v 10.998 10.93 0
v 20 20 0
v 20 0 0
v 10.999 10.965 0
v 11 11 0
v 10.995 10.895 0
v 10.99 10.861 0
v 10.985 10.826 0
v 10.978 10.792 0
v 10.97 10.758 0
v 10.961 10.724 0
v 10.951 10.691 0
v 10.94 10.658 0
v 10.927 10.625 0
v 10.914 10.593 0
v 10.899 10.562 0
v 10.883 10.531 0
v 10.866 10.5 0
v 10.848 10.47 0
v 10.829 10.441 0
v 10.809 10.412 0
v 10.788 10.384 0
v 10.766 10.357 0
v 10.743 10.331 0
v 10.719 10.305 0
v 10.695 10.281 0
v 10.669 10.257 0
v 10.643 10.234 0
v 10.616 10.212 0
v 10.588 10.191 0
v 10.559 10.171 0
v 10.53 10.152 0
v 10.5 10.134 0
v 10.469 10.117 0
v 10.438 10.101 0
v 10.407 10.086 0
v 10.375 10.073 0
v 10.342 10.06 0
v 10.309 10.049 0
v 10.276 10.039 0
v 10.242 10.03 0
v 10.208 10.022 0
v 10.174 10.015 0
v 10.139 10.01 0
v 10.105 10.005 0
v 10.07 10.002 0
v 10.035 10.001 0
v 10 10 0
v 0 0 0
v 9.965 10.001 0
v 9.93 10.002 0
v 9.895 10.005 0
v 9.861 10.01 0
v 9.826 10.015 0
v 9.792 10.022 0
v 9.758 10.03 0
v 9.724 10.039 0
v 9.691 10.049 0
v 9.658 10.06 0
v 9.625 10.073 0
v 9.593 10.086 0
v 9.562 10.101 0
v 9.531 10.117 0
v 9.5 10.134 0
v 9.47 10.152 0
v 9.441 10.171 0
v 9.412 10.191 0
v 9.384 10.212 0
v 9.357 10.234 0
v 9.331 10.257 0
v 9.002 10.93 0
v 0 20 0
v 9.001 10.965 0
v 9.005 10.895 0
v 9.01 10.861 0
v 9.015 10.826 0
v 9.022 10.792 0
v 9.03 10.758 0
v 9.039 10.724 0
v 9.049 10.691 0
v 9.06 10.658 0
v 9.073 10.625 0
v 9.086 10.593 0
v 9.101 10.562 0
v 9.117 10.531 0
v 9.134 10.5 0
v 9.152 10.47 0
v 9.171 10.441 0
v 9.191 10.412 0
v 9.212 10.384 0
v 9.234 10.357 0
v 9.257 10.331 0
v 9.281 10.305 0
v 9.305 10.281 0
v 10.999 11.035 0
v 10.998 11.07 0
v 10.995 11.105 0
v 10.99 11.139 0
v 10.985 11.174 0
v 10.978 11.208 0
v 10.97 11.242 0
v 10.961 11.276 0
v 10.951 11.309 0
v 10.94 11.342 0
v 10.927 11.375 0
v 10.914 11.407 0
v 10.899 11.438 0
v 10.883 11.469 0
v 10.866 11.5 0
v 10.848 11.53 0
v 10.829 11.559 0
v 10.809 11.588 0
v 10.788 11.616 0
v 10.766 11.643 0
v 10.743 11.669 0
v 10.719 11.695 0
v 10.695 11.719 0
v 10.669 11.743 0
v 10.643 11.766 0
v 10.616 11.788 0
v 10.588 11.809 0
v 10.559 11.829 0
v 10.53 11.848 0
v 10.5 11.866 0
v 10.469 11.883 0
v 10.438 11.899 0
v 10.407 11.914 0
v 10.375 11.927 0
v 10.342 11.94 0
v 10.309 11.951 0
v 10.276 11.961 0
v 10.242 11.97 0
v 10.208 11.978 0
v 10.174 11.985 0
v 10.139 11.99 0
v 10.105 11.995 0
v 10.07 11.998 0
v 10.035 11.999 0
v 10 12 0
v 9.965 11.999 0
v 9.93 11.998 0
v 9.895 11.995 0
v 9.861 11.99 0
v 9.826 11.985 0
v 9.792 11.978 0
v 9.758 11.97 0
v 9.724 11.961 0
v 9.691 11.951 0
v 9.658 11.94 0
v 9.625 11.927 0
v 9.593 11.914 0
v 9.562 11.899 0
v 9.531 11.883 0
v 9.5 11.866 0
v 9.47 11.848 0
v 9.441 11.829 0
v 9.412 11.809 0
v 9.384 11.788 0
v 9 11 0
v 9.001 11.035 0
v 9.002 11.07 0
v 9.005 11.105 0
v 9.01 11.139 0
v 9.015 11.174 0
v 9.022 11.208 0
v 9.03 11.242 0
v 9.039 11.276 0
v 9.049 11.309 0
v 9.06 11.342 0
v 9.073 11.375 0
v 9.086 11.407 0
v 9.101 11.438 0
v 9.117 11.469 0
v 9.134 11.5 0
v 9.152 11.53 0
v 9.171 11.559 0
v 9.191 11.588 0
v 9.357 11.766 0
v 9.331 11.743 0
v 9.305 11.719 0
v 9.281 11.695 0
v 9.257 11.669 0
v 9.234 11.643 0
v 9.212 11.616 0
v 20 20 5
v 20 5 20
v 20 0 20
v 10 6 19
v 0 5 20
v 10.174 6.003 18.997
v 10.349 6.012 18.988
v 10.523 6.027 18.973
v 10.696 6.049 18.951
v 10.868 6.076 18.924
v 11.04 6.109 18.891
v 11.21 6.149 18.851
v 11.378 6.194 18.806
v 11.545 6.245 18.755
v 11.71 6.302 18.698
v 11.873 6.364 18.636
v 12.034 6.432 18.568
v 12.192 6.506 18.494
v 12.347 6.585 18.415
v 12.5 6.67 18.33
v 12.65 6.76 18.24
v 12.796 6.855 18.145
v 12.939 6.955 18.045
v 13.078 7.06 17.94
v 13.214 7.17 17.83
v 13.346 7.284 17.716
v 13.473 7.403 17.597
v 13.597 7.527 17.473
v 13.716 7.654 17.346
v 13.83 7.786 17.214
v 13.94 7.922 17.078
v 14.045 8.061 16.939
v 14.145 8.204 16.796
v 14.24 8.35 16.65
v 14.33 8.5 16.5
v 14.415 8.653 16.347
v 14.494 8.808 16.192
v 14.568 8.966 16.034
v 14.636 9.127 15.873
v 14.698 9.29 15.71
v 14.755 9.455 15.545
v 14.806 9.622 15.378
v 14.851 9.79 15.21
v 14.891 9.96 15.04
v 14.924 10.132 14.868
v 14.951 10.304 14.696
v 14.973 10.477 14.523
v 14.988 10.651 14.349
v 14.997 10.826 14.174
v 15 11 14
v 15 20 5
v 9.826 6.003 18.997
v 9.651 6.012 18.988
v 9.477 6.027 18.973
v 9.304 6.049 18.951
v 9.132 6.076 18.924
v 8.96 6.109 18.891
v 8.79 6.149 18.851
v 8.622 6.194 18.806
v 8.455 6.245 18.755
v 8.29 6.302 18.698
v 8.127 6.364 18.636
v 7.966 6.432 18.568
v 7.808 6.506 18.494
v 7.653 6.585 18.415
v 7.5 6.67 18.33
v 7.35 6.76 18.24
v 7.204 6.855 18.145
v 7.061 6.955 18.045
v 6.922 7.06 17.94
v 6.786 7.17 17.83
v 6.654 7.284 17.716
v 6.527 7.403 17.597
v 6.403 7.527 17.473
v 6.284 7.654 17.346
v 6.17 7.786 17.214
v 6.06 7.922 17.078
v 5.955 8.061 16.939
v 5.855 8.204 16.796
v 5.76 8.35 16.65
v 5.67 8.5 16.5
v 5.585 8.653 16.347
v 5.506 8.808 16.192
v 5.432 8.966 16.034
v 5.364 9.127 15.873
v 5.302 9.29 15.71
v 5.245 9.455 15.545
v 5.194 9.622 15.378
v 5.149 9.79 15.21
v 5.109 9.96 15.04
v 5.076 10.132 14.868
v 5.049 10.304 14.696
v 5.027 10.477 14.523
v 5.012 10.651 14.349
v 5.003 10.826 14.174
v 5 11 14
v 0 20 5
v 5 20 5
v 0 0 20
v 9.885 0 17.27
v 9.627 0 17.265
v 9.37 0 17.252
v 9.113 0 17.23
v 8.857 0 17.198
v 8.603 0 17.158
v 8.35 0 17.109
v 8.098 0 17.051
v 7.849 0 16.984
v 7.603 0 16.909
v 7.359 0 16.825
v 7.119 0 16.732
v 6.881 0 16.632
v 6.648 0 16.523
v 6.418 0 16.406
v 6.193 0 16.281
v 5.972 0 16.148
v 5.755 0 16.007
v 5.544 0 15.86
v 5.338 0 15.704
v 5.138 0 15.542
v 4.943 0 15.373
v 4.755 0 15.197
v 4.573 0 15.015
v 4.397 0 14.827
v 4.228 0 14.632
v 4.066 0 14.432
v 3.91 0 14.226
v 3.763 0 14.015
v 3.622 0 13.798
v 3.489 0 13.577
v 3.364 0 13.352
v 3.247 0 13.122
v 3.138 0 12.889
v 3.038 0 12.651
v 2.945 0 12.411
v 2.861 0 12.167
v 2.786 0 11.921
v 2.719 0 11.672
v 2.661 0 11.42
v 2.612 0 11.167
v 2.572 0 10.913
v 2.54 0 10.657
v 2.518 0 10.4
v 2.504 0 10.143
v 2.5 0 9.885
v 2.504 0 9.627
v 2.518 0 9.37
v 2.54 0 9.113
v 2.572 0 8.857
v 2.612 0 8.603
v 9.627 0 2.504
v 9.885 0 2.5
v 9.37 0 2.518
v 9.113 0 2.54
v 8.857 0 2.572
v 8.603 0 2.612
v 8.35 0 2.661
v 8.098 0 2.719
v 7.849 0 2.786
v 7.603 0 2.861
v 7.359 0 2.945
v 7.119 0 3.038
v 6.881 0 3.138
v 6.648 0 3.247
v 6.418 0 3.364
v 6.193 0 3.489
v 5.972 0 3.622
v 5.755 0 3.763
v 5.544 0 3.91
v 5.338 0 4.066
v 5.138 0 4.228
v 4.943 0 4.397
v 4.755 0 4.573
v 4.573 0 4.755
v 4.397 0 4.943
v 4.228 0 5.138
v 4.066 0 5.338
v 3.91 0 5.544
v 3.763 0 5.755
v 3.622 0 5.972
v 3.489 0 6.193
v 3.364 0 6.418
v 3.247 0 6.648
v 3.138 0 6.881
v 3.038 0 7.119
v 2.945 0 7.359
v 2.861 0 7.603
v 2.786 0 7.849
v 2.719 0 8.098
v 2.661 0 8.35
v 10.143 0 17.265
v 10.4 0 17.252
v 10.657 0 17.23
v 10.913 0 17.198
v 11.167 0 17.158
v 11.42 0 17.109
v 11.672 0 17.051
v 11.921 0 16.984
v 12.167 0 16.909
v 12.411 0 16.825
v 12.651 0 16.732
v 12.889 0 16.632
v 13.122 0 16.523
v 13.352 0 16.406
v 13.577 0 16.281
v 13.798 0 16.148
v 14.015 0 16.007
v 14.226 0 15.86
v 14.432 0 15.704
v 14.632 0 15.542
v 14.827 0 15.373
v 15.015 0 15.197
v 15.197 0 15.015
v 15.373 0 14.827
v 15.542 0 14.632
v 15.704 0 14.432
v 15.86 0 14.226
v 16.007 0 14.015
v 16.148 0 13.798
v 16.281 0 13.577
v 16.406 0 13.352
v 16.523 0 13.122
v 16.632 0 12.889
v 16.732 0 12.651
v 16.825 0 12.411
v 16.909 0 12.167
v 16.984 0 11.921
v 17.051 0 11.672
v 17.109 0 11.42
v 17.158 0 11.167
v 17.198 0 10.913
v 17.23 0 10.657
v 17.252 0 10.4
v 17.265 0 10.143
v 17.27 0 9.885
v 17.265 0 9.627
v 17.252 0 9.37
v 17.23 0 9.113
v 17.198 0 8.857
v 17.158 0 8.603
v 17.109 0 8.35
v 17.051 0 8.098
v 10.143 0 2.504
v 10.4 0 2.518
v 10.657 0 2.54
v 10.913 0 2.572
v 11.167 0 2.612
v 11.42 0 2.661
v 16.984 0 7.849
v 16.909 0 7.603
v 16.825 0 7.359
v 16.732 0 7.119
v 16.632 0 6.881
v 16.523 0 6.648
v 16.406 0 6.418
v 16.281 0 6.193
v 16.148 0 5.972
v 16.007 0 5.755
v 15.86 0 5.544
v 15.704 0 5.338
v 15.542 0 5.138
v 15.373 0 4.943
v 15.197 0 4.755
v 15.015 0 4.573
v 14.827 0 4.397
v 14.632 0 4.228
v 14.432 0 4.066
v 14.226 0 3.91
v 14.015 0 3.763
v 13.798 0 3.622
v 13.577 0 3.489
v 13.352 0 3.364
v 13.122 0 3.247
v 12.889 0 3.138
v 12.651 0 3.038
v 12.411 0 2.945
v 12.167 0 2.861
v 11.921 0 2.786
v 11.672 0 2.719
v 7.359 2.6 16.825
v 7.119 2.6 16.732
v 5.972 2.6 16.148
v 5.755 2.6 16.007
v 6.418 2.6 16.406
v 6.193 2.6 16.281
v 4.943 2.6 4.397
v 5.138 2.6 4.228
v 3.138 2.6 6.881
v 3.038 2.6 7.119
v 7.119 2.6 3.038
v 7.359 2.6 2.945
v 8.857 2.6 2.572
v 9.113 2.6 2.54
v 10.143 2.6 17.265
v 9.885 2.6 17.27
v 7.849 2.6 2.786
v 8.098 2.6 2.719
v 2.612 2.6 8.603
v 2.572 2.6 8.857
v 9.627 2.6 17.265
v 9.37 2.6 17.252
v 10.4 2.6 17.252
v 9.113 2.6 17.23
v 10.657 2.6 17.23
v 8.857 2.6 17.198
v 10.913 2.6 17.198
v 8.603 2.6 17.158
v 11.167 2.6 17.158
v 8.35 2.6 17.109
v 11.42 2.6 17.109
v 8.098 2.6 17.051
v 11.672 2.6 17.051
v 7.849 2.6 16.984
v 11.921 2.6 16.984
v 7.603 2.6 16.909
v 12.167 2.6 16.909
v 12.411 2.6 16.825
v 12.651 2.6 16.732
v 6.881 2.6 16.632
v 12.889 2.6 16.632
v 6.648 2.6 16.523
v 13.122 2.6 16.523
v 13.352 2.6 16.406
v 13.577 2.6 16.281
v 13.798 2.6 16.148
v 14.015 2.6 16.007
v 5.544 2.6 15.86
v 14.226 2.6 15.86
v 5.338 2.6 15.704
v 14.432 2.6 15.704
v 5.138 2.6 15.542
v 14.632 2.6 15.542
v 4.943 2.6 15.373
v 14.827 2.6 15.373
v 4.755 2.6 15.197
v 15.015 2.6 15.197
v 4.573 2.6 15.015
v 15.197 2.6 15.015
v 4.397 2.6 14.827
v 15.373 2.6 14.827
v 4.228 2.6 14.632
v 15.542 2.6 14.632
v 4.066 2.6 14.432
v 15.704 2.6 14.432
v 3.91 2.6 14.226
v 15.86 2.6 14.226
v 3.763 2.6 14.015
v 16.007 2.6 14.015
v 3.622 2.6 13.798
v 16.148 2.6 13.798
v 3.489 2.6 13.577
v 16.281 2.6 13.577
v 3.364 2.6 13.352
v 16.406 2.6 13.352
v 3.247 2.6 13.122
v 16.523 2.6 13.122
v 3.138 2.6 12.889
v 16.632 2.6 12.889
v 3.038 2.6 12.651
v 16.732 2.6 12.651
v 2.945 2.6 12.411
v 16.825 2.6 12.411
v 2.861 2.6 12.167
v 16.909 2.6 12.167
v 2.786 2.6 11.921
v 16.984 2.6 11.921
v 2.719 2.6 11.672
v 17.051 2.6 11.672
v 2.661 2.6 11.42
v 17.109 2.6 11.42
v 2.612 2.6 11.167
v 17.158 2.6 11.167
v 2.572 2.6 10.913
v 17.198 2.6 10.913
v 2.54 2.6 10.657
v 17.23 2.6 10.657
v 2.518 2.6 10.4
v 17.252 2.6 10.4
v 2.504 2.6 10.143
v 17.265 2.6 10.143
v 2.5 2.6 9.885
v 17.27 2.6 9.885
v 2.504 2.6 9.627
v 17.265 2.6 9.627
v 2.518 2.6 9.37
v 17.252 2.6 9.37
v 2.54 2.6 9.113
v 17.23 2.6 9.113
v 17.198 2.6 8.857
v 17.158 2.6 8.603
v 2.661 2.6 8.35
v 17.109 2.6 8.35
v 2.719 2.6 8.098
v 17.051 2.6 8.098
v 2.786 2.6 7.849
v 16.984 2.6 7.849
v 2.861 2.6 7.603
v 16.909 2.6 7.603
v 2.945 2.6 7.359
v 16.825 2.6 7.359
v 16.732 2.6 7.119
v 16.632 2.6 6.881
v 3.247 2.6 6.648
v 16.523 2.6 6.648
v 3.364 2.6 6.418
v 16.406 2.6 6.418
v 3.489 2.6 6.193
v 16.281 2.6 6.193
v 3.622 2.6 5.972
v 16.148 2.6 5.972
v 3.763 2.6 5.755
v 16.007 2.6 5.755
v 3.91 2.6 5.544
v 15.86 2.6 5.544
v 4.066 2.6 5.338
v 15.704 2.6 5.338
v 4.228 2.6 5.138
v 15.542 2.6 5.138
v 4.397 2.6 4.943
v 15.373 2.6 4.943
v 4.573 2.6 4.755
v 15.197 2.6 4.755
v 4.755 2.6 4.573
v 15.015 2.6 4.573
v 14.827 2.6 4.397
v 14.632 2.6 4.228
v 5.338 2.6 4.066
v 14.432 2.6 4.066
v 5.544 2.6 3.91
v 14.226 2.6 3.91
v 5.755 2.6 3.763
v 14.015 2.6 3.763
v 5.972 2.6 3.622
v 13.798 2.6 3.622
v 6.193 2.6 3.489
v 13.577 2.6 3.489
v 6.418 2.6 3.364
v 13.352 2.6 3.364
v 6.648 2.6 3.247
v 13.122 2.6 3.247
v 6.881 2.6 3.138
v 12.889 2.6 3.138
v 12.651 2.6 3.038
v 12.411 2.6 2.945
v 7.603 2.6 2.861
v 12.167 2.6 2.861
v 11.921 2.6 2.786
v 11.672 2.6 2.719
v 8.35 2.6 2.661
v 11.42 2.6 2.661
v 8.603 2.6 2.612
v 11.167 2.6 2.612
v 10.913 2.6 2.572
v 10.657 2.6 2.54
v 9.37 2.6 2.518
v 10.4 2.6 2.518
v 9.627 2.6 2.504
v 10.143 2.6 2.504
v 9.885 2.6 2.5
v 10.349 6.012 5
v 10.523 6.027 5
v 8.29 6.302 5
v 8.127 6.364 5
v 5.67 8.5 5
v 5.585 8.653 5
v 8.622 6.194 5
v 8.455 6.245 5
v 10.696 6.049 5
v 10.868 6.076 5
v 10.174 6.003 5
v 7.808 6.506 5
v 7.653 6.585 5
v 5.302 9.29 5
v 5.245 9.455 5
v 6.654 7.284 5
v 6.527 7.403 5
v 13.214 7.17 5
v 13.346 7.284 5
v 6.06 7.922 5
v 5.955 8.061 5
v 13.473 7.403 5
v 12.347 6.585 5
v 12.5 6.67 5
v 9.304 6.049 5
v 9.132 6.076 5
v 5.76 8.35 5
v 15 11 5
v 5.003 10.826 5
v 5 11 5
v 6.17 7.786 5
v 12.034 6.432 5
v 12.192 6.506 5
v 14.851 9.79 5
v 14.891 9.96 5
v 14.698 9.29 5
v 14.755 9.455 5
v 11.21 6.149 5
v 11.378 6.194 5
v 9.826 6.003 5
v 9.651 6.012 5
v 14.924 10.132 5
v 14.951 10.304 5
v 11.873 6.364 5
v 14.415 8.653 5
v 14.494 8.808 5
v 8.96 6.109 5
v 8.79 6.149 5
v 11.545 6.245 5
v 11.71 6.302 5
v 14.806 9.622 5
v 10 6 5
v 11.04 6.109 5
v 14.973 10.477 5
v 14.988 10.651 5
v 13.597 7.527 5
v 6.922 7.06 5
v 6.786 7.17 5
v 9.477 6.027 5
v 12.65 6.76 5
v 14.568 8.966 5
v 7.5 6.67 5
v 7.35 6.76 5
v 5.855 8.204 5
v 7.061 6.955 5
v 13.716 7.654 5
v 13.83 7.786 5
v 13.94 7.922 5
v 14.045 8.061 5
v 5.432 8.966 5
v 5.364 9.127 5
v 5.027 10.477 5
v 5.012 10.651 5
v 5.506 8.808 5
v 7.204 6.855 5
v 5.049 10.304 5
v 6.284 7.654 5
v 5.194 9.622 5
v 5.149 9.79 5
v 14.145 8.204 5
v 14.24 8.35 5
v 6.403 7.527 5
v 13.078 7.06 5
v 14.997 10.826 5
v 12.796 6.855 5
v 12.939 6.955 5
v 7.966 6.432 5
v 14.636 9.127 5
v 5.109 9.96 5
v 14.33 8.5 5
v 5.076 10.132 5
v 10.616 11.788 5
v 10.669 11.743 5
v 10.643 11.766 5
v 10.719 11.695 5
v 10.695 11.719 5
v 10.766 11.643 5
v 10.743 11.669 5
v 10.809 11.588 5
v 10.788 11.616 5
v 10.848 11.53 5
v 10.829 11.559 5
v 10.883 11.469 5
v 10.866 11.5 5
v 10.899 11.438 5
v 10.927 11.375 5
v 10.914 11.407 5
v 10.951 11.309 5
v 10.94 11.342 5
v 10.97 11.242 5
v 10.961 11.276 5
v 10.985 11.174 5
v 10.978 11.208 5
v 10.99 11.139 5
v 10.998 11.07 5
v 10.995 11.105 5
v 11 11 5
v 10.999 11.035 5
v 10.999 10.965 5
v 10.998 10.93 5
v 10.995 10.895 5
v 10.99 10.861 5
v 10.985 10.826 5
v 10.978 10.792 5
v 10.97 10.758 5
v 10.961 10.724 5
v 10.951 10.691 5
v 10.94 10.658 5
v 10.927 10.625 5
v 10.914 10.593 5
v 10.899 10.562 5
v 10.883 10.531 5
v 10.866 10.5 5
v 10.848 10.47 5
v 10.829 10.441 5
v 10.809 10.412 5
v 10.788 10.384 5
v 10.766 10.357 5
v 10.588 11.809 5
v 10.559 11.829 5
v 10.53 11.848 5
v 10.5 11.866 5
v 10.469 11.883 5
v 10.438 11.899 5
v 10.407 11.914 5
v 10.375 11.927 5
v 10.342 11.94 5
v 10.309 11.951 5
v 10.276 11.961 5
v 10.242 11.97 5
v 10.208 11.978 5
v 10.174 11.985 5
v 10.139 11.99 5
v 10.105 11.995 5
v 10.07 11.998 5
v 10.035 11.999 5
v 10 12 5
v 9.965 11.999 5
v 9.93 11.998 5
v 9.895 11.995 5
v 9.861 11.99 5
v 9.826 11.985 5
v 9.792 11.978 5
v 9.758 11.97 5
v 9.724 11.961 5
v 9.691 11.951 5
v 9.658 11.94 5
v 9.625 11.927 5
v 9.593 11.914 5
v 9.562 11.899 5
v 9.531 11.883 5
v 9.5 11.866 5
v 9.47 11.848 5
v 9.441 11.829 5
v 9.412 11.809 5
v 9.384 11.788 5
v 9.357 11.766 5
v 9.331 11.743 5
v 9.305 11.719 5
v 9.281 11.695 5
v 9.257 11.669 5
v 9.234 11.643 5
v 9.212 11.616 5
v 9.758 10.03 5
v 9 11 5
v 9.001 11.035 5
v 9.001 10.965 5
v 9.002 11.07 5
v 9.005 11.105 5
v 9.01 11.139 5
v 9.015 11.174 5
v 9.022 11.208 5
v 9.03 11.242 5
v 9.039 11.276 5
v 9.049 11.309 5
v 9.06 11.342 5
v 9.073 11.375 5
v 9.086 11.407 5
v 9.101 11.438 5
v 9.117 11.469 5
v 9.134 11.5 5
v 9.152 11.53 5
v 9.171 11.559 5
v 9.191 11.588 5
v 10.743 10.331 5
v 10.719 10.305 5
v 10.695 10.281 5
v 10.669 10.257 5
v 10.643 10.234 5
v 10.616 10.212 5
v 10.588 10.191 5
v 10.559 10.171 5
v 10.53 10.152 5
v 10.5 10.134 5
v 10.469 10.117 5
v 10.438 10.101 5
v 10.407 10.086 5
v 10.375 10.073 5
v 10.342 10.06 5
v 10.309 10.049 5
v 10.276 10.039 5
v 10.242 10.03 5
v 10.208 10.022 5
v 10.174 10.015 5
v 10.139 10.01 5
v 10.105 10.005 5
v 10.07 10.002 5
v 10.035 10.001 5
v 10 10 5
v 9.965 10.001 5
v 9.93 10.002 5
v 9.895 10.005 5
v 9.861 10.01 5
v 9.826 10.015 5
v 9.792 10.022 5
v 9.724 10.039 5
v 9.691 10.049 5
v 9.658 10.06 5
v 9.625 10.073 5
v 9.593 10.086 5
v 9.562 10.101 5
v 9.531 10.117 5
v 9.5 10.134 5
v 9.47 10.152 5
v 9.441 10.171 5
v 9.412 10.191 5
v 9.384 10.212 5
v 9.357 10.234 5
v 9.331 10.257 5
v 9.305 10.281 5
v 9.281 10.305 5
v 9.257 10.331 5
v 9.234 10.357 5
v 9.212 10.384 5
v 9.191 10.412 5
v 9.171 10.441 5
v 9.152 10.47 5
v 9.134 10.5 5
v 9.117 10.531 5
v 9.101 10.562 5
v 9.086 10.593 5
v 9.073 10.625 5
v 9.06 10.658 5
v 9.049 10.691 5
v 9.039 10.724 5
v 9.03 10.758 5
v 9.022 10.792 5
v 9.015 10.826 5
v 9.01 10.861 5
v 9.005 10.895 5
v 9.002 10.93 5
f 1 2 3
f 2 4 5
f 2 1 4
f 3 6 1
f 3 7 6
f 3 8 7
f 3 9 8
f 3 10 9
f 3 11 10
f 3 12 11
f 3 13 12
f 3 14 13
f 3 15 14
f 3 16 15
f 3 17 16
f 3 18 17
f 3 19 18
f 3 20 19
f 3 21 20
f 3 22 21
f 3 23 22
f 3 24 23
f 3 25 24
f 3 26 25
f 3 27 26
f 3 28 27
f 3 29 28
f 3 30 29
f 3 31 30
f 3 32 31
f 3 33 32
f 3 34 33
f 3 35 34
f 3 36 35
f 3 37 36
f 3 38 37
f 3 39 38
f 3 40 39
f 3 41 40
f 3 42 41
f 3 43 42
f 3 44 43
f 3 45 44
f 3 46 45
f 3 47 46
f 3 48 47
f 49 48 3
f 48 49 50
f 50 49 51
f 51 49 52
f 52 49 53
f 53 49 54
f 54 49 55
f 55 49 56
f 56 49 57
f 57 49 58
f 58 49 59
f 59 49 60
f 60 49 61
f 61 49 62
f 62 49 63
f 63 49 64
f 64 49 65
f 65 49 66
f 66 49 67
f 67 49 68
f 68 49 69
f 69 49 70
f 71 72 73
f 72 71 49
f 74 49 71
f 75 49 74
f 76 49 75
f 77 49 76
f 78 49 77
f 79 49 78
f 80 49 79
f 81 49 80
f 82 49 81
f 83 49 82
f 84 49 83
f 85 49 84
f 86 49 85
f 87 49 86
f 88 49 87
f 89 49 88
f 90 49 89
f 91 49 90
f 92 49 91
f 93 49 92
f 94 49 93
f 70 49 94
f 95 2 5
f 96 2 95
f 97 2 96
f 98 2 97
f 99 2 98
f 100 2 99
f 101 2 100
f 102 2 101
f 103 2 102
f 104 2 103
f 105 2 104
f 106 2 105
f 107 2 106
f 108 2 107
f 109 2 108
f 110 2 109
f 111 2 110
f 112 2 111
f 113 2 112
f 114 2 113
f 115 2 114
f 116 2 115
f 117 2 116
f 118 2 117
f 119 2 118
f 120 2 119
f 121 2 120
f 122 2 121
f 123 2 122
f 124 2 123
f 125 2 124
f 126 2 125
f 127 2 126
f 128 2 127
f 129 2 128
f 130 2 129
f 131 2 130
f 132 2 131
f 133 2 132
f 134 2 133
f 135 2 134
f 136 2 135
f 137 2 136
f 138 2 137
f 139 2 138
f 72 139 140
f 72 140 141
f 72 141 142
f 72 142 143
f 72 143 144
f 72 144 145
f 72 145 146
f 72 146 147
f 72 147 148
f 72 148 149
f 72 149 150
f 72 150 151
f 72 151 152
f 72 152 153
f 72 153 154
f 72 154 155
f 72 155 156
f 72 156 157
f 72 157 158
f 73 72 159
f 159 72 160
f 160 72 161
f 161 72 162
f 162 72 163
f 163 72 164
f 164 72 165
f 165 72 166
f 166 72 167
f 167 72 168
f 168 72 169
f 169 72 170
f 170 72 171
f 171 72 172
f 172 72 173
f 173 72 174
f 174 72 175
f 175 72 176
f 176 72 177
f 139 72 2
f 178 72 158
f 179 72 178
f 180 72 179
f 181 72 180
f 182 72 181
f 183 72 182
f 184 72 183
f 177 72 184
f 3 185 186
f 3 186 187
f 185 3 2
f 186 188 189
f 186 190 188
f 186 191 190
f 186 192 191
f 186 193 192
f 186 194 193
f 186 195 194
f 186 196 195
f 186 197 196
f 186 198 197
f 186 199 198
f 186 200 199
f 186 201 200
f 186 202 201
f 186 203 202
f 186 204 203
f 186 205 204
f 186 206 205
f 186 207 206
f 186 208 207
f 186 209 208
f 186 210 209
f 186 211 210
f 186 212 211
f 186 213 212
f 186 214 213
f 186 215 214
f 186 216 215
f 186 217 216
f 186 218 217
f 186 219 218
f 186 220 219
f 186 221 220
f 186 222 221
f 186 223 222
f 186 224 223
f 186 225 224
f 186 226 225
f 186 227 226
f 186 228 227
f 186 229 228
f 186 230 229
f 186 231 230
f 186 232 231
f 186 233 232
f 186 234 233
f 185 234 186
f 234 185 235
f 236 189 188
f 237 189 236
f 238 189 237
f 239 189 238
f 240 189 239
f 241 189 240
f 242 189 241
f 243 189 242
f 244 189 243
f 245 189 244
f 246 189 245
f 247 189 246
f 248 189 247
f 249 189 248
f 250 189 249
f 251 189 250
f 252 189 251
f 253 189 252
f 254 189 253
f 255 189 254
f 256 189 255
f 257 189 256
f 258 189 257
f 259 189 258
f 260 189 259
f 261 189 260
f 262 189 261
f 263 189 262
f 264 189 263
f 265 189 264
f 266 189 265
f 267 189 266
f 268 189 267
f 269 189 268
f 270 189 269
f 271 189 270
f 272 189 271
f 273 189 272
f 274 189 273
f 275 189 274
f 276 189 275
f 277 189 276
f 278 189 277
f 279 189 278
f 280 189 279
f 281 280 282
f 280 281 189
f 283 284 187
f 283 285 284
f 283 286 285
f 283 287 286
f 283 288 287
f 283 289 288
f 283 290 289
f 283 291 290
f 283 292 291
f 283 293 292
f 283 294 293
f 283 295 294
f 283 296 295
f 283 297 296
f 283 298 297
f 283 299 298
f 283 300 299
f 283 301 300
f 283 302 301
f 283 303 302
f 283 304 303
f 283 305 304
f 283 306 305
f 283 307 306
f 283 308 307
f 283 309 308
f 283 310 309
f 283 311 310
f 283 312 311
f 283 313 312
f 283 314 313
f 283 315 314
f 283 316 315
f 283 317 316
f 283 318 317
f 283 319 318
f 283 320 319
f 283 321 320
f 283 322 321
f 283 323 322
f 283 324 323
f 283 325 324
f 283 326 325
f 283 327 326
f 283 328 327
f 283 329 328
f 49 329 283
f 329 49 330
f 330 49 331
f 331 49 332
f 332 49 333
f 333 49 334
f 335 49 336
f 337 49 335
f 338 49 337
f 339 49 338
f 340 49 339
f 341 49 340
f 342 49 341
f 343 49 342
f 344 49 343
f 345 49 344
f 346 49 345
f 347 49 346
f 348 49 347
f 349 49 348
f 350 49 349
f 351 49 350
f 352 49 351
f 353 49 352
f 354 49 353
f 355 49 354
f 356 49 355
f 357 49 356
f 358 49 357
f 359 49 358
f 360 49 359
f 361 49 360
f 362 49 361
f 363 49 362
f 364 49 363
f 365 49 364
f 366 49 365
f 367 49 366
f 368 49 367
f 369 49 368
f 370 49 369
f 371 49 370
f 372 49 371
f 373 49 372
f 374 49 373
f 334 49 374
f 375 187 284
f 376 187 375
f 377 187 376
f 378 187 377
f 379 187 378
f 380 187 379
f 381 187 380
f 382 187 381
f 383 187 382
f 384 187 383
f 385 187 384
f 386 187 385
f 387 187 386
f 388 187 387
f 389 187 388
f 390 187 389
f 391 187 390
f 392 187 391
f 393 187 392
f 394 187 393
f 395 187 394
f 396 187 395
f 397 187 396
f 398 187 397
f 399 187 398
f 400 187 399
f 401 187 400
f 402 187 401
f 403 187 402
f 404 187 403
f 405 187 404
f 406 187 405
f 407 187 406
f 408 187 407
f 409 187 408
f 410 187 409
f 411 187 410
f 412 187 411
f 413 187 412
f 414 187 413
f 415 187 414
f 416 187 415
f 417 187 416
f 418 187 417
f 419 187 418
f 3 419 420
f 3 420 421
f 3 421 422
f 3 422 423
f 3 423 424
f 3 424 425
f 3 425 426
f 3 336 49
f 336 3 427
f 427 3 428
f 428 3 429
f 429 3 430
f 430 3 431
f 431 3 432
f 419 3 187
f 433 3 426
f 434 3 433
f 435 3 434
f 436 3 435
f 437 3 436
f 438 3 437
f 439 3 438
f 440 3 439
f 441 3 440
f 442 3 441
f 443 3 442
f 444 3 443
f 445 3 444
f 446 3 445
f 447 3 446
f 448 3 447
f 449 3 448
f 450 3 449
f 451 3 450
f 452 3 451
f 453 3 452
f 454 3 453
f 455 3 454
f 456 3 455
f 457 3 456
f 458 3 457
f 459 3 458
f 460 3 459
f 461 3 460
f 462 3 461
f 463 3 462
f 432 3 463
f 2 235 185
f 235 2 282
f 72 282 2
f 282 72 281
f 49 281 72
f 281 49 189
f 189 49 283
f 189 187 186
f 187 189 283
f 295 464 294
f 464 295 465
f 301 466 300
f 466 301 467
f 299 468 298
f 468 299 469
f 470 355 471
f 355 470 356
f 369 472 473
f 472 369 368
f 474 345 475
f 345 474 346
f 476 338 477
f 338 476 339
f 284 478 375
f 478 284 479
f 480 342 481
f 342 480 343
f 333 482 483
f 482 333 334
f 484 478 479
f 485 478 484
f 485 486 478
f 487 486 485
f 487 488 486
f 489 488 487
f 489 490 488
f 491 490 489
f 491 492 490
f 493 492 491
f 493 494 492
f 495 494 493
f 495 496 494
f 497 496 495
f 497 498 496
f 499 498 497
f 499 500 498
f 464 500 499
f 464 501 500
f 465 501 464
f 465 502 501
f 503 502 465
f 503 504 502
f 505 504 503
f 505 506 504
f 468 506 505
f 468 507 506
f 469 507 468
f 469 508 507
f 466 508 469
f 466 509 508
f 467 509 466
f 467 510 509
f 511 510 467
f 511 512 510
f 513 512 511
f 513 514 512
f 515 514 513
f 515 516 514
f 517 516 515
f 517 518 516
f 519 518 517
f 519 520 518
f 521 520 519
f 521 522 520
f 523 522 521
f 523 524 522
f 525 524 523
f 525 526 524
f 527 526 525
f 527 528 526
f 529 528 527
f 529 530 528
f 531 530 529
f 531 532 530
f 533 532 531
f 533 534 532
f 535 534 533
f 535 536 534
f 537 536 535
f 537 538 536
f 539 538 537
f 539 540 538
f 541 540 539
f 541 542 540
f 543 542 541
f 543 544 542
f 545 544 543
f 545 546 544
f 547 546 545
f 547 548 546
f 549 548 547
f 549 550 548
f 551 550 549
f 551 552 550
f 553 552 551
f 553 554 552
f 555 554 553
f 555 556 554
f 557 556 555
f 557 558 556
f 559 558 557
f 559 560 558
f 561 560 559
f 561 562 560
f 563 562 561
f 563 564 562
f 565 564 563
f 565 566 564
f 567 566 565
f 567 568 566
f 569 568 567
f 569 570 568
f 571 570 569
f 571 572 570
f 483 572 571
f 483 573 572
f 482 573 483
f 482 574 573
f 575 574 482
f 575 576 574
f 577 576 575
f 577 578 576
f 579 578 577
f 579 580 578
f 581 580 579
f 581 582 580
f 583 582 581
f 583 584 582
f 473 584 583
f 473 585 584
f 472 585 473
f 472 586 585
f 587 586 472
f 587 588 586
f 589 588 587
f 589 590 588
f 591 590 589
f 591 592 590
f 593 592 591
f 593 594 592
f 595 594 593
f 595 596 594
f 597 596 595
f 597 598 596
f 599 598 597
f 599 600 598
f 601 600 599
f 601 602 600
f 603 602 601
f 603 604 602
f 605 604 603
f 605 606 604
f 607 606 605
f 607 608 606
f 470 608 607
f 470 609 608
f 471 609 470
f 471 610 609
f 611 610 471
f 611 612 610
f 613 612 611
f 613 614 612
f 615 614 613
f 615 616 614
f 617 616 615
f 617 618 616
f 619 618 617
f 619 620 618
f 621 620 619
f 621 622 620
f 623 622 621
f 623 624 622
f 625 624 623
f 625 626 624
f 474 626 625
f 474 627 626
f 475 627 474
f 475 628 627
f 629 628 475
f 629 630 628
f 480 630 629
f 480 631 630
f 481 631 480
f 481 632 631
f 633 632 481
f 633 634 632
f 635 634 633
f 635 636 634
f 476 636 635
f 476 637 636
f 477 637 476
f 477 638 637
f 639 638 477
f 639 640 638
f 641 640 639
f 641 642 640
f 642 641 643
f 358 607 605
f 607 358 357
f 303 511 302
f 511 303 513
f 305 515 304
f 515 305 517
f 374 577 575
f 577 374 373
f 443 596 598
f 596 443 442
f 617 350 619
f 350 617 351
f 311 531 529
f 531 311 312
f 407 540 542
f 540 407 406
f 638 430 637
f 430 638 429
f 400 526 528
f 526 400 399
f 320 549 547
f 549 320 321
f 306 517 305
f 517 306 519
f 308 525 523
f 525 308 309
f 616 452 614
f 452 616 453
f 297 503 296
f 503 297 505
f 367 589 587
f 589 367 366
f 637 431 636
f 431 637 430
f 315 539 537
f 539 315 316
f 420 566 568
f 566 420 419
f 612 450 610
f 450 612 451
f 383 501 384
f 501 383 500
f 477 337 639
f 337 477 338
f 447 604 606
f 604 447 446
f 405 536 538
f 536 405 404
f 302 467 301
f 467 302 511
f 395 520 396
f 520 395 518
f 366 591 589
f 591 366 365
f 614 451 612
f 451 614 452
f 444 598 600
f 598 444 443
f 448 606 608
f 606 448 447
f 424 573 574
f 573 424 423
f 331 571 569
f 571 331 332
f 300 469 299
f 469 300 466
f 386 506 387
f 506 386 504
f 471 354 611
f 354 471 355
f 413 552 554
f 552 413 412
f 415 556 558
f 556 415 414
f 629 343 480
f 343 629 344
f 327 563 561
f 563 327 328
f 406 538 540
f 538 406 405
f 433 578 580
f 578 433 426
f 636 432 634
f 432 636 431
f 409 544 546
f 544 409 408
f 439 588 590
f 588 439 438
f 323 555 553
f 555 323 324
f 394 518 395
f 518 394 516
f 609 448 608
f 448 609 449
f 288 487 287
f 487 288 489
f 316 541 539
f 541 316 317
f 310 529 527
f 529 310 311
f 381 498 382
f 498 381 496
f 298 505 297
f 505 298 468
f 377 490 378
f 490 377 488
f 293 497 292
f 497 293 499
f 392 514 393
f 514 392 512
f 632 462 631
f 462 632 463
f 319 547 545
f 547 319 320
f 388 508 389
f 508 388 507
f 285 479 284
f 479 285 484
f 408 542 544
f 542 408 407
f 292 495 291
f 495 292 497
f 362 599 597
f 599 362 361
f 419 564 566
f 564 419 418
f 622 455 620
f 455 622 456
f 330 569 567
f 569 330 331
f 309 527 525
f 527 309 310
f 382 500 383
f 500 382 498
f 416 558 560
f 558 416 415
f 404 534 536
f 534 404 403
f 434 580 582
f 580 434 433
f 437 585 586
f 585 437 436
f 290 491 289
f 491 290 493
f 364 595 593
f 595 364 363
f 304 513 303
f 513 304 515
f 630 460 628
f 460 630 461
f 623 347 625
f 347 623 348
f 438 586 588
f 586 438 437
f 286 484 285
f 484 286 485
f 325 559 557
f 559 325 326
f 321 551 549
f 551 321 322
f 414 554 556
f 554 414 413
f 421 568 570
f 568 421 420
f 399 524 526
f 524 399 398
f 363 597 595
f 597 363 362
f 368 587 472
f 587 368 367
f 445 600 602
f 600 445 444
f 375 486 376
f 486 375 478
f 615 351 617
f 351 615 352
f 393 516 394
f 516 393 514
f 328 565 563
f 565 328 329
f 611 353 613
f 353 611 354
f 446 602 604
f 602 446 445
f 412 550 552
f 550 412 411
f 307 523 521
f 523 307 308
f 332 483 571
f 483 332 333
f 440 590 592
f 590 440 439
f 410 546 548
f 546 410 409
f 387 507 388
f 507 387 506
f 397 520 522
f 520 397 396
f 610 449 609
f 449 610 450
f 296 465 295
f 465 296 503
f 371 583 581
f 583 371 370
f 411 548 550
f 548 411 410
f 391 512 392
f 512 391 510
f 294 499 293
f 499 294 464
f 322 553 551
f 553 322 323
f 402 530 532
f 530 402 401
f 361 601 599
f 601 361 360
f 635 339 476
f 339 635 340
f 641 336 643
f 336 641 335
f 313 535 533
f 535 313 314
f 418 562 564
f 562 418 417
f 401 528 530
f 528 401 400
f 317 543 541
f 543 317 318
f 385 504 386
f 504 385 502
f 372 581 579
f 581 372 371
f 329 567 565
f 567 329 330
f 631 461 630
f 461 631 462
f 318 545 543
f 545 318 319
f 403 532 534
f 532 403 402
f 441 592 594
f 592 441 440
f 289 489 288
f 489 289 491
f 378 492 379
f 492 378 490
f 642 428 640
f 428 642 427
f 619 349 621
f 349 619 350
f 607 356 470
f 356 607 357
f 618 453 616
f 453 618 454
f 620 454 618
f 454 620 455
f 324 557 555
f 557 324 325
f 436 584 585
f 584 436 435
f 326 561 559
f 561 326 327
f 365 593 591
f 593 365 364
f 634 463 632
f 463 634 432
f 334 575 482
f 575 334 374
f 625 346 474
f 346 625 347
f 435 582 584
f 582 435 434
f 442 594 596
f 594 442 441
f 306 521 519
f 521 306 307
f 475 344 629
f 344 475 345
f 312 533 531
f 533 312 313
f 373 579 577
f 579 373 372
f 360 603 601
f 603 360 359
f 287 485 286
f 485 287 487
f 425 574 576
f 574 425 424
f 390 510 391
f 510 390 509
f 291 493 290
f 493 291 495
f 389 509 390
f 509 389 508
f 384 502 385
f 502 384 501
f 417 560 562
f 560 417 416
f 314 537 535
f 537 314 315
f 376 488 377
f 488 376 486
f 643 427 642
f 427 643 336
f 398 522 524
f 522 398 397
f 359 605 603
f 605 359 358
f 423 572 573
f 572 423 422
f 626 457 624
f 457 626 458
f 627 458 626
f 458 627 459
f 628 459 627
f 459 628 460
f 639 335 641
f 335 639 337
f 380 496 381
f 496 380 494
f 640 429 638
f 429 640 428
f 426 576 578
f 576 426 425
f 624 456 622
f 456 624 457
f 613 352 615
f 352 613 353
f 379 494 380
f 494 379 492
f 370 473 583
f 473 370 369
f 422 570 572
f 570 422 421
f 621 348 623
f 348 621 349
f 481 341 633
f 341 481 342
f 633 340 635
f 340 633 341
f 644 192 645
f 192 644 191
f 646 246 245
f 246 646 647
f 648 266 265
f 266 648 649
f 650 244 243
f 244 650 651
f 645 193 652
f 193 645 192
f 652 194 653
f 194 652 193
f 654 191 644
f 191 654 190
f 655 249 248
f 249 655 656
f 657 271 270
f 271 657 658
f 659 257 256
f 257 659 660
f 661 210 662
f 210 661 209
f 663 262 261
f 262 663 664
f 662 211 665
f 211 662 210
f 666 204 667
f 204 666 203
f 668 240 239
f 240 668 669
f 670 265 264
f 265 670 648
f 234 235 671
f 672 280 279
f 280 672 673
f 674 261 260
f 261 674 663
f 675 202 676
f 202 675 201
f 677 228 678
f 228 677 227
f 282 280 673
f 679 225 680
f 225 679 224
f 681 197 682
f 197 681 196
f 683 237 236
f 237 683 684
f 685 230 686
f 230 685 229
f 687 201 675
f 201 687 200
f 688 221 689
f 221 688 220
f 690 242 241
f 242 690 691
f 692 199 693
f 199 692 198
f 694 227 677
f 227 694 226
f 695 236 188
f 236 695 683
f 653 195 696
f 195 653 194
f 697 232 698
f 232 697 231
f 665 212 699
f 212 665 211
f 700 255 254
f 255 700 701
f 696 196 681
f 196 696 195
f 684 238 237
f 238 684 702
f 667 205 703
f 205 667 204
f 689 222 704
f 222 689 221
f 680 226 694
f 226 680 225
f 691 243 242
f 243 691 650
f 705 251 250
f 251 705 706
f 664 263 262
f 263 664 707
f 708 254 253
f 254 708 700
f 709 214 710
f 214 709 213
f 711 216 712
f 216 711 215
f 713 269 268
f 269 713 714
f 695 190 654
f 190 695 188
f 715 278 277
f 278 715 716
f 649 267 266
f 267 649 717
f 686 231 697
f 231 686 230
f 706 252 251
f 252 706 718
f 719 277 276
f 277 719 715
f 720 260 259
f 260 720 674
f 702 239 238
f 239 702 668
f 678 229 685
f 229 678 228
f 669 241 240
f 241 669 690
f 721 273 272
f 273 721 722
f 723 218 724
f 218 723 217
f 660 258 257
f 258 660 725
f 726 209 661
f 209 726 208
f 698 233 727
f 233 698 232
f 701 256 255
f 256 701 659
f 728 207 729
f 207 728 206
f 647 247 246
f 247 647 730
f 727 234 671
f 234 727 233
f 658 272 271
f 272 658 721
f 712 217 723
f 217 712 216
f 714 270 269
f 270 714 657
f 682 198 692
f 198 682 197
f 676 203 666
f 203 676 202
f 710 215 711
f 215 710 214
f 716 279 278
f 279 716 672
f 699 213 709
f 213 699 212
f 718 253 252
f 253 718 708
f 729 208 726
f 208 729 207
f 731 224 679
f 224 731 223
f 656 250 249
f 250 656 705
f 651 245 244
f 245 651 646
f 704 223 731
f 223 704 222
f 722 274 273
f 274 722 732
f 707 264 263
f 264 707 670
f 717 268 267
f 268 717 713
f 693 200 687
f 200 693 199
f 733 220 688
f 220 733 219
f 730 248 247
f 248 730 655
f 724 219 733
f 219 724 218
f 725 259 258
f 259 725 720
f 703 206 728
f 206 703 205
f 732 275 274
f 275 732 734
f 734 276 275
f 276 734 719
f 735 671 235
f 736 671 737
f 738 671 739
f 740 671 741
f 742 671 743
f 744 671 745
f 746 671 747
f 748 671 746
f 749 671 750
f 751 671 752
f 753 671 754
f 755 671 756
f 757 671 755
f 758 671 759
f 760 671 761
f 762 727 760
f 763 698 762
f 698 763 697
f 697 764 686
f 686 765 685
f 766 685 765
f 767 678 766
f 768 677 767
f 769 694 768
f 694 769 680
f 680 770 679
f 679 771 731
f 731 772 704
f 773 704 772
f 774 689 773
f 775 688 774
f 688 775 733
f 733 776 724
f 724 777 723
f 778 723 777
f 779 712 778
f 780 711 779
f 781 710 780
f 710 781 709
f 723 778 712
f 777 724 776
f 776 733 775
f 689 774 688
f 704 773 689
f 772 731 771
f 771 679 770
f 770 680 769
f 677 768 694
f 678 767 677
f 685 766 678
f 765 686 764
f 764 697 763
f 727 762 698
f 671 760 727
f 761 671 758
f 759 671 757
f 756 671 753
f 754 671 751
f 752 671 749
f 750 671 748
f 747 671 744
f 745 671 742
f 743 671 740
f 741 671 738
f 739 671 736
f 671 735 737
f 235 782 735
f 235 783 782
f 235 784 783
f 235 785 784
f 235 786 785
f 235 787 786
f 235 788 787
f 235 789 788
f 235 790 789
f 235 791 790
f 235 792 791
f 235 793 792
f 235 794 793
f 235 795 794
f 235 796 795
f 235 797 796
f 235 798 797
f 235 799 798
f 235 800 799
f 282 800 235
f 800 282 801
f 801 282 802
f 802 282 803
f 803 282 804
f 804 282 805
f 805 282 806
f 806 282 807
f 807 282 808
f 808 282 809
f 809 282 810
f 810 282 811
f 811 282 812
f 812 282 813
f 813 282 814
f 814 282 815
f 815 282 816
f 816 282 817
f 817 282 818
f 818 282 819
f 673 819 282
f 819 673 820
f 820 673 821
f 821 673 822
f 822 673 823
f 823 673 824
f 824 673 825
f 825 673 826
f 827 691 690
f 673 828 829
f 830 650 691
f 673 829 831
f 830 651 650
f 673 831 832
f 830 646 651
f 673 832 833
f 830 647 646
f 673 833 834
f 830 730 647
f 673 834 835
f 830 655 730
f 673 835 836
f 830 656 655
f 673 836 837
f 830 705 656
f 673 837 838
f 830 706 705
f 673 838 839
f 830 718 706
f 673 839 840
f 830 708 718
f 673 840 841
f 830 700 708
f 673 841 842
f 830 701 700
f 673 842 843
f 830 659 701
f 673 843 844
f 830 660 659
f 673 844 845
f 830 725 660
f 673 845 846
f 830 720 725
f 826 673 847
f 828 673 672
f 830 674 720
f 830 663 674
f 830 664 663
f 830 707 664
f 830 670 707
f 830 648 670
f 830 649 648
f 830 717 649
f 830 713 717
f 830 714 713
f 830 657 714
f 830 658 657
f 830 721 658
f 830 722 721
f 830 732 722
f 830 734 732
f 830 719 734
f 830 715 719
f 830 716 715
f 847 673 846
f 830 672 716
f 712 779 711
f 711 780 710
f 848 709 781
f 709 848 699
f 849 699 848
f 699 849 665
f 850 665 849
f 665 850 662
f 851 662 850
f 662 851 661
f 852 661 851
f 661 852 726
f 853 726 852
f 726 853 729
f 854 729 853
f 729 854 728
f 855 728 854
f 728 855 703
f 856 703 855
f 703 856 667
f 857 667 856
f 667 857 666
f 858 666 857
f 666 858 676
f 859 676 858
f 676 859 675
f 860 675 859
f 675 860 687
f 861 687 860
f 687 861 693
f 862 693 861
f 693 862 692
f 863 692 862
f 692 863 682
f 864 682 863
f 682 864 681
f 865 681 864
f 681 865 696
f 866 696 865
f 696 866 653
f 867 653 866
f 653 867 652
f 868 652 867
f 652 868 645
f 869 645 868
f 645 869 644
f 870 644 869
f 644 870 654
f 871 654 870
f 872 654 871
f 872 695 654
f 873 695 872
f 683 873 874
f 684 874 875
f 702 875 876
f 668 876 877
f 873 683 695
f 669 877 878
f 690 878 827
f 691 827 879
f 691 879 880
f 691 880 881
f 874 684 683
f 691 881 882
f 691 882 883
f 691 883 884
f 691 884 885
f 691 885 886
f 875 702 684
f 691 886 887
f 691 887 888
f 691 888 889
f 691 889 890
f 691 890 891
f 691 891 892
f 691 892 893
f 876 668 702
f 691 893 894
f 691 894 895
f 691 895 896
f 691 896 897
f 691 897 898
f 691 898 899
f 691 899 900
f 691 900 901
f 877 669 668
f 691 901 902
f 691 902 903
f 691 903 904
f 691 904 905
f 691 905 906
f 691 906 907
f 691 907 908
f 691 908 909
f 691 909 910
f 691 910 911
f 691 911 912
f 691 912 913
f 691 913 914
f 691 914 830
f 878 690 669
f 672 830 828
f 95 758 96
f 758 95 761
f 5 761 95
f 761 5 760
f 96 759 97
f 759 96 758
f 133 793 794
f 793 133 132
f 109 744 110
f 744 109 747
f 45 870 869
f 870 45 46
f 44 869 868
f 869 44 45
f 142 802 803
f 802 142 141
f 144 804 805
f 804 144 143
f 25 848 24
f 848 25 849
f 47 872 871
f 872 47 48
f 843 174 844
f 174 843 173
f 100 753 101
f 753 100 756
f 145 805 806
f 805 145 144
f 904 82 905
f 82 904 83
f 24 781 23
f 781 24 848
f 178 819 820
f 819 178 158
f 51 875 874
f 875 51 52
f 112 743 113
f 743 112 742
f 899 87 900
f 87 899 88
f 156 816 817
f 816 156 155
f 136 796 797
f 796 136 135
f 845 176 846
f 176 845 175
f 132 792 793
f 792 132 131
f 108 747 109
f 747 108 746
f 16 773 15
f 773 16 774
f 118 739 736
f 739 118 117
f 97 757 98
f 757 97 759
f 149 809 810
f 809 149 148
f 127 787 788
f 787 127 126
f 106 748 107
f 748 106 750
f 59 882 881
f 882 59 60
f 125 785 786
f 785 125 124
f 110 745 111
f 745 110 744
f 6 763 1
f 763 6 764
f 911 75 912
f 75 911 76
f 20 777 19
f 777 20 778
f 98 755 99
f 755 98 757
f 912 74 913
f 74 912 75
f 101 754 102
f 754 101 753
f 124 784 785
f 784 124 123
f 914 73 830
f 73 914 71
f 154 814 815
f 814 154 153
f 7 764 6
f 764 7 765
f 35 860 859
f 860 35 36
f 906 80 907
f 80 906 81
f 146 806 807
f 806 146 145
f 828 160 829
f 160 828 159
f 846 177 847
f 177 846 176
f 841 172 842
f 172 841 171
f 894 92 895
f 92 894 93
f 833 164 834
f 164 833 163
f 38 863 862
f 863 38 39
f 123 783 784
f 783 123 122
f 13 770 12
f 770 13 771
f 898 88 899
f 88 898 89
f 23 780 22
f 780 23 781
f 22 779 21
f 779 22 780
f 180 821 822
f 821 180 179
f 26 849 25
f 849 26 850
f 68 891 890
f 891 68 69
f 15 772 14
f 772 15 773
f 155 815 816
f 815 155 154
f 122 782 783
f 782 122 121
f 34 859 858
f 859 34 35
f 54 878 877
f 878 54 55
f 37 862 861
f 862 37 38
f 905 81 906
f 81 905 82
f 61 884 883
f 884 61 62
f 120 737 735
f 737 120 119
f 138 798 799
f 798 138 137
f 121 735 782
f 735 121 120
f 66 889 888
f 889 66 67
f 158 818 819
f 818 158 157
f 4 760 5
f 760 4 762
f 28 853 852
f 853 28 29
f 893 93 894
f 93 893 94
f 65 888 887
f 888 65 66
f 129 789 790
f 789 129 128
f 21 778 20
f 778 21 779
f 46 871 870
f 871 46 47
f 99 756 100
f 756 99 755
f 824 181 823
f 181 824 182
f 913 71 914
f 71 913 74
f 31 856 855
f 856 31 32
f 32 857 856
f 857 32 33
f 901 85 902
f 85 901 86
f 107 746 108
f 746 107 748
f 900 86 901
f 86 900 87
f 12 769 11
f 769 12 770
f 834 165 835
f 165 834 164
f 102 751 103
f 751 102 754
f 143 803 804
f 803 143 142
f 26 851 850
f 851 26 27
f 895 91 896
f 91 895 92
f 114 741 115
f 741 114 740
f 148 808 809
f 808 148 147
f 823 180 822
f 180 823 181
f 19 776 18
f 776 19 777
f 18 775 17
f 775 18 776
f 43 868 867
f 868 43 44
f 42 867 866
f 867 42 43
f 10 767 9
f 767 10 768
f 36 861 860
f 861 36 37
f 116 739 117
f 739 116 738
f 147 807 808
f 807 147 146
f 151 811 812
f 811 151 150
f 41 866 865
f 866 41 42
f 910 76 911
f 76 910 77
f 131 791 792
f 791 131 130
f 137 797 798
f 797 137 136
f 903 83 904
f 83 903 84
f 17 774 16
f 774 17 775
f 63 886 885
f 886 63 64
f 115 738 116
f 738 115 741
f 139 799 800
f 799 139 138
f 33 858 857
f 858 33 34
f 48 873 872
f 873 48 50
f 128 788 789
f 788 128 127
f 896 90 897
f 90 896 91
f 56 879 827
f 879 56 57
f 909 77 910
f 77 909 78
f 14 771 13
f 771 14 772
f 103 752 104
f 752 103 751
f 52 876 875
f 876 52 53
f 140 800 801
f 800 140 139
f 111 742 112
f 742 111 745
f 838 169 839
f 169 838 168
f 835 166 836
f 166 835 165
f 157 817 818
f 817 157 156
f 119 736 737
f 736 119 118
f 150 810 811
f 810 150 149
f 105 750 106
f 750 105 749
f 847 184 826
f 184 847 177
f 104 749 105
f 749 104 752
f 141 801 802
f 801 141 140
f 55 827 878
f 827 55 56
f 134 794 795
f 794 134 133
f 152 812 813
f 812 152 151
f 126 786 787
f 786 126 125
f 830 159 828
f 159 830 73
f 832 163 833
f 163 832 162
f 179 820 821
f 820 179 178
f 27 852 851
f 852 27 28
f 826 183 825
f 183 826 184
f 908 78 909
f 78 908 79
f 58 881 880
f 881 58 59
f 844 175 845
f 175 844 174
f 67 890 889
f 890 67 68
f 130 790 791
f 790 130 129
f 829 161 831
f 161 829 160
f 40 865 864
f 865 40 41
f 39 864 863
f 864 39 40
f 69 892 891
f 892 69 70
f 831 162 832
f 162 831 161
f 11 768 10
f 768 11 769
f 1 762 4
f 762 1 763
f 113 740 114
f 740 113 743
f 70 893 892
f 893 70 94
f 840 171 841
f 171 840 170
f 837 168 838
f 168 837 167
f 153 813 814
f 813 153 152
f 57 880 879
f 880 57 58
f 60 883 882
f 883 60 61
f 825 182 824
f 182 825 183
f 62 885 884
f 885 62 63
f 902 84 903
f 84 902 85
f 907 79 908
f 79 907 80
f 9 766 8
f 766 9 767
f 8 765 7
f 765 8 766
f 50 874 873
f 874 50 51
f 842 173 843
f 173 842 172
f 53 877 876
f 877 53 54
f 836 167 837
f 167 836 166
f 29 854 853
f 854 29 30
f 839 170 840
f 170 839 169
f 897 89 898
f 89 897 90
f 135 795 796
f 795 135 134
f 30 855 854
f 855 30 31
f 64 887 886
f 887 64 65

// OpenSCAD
$fn=180;

module magnet() {
    difference() {
        cylinder(h=2.61,d=14.77);
        translate([0,0,-0.01]) cylinder(d=14.77-5.3*2, h=1.35+0.02);
        translate([0,0,1.35]) cylinder(d1=14.77-5.3*2, d2=14.77-4.17*2, h=2.61-1.35+0.01);
    }
    
}


module wallPart() {
    difference() {
        hull() {
            cube([20,5,20]);
            cube([20,20,5]);
        }
        hull() translate([14.77/2+2.5,2.60,14.77/2+2.5]) rotate([90,0,0]) magnet();
        hull() {
            translate([10,20,5]) cylinder(d=10,h=20);
            translate([10,11,5]) cylinder(d=10,h=20);
        }
        translate([10,11,-0.01]) cylinder(d=2,h=20);
    }
}

wallPart();
